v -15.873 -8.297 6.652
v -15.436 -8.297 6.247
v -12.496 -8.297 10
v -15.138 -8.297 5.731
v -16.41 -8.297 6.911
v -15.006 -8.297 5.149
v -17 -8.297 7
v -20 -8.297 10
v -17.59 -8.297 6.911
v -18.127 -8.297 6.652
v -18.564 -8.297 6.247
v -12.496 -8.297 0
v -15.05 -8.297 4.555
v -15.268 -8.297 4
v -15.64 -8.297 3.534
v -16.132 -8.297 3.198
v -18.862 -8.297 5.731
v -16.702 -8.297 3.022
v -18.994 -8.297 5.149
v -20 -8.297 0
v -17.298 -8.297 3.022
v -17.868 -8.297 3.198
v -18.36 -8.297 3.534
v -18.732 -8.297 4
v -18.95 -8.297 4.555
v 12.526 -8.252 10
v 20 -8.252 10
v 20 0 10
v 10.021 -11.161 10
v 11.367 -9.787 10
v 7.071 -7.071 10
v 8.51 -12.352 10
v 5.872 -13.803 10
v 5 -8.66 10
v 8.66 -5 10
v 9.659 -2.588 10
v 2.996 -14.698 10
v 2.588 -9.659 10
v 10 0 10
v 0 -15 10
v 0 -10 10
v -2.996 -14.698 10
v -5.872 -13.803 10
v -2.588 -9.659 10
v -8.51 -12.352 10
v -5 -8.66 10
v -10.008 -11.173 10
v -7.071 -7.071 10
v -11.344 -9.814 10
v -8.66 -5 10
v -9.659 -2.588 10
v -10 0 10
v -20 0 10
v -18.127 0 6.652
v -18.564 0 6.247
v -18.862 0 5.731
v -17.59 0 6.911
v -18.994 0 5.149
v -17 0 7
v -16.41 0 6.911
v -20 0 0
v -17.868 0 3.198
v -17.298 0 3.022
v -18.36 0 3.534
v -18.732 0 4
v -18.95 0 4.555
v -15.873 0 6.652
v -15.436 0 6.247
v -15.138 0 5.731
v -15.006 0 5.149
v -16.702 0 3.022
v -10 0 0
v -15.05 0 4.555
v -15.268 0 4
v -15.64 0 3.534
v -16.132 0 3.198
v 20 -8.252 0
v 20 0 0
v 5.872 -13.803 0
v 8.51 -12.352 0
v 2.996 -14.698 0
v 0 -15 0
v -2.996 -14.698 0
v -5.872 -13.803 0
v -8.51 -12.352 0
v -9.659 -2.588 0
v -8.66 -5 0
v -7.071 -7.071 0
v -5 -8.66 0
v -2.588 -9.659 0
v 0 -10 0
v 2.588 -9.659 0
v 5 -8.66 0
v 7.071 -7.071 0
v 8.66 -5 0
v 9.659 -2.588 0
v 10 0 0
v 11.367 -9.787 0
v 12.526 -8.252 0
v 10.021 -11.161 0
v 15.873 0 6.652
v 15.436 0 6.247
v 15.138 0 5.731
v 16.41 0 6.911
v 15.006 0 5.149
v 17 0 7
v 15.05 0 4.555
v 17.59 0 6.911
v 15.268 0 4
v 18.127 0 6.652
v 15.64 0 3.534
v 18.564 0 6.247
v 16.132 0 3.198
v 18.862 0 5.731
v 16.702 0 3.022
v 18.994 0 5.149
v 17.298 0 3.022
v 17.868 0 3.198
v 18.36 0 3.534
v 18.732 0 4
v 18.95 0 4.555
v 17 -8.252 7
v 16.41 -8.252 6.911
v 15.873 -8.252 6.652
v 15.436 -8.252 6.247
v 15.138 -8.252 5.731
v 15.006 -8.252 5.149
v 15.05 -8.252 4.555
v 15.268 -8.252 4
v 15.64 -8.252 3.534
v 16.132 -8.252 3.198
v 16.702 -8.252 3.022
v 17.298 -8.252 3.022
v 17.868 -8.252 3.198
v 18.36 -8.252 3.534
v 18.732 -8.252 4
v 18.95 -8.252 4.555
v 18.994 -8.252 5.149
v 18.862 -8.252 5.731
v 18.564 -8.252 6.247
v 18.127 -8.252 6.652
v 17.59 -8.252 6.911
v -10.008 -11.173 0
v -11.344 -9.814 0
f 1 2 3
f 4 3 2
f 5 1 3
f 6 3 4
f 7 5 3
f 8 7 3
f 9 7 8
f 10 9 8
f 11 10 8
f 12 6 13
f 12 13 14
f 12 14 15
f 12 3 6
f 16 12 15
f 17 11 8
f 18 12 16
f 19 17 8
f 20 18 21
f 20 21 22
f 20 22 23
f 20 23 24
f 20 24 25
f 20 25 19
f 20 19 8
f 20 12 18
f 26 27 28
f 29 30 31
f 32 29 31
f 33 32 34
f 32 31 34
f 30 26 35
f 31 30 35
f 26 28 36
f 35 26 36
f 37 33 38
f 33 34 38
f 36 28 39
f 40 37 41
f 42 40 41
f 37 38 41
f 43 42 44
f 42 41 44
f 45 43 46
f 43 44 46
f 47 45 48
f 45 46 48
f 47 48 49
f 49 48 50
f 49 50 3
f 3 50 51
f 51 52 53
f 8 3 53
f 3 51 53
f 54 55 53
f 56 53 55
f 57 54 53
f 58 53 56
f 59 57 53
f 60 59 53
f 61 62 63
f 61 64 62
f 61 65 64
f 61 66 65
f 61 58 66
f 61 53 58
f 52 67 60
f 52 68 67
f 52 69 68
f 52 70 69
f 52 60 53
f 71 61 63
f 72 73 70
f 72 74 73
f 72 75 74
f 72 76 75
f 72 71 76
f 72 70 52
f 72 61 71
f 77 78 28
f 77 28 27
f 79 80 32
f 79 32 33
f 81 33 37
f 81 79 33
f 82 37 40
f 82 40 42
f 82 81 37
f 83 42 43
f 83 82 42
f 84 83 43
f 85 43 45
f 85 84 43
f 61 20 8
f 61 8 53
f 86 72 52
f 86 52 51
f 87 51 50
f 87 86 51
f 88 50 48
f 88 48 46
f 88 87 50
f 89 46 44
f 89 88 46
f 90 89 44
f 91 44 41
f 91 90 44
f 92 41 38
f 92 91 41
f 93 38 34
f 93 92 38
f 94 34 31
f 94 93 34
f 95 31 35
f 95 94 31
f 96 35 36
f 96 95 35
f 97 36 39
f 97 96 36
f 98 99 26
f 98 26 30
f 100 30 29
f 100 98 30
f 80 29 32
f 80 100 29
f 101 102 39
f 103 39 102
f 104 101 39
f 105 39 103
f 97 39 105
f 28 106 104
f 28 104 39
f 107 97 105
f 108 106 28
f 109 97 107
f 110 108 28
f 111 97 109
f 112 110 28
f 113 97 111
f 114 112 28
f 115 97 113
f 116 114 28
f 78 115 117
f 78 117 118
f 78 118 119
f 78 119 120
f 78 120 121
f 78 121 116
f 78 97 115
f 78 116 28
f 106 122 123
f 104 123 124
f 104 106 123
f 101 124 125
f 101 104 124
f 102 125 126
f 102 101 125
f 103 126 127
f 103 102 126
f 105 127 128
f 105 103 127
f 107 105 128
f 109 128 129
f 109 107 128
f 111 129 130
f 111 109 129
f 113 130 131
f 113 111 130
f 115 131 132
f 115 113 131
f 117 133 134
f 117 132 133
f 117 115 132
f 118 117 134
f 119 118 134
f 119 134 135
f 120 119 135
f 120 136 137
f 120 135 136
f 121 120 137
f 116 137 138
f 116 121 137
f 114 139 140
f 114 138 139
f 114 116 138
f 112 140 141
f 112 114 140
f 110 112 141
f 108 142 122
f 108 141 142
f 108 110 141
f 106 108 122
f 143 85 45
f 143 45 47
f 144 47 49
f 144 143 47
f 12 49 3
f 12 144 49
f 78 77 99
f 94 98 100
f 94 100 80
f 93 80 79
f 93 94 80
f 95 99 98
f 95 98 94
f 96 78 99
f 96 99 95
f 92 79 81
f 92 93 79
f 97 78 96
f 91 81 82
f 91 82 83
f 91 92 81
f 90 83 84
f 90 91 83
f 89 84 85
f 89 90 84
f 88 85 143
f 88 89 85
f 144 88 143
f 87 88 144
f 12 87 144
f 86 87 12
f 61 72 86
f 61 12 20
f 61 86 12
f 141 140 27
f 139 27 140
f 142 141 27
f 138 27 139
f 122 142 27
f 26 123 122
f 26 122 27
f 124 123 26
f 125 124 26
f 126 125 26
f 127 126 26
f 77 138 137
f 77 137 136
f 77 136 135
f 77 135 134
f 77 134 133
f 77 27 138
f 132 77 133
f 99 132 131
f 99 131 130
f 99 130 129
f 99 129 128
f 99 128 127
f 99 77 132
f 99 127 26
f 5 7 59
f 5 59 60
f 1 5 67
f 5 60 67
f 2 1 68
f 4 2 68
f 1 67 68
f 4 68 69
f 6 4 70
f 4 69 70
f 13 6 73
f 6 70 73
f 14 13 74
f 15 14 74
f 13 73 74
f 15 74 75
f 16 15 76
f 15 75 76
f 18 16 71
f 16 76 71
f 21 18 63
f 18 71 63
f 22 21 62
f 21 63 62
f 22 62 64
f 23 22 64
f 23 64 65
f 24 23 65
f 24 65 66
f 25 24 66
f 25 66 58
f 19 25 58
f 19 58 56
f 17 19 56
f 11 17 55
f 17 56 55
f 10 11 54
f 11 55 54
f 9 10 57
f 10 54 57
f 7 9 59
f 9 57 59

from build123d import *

# Parameters (mm, degrees)
BOSS_EXTRUDE1_DEPTH = 10


with BuildPart() as part:
    # Sketch1 → Boss-Extrude1 (new body)
    with BuildSketch(Plane.XY):
        with BuildLine():
            Line((-15, 0), (-10, 0))
            ThreePointArc((-10, 0), (0, -10), (10, 0))
            Line((10, 0), (15, 0))
            Line((15, 0), (20, 0))
            Line((20, 0), (20, -8.252048805))
            Line((20, -8.252048805), (12.52612033, -8.252048805))
            ThreePointArc((12.52612033, -8.252048805), (10.716124589, -10.495936061), (8.510293561, -12.352121417))
            ThreePointArc((8.510293561, -12.352121417), (0, -15), (-8.510293561, -12.352121417))
            ThreePointArc((-8.510293561, -12.352121417), (-10.697242908, -10.515179227), (-12.496376594, -8.297021877))
            Line((-12.496376594, -8.297021877), (-20, -8.297021877))
            Line((-20, -8.297021877), (-20, 0))
            Line((-20, 0), (-15, 0))
        make_face()
    extrude(amount=BOSS_EXTRUDE1_DEPTH)

    # Sketch7 → Ø4.0 (4) Diameter Hole2 (revolve, cut)
    with BuildSketch(Plane(origin=(17, 0, 5), x_dir=(0, 0, 1), z_dir=(1, 0, 0))):
        Polygon((0, 0), (0, 11.201721238), (2, 10), (2, 0), align=None)
    f_4_0_4_diameter_hole2 = revolve(axis=Axis((17, 6.35, 5), (0, -1, 0)), mode=Mode.SUBTRACT)

    # Mirror2: Ø4.0 (4) Diameter Hole2 across plane
    add(f_4_0_4_diameter_hole2.mirror(Plane(origin=(0, 0, 0), x_dir=(0, 0, 1), z_dir=(1, 0, 0))), mode=Mode.SUBTRACT)


solid = part.part
